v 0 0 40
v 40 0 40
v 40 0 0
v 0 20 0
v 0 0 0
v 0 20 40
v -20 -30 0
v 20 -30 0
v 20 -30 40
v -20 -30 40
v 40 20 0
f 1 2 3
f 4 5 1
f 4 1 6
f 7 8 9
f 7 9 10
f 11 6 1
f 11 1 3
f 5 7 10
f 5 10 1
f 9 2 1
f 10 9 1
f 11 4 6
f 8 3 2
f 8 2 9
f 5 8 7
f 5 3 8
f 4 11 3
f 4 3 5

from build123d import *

# Parameters (mm, degrees)
SKETCH1_W           = 40
SKETCH1_H           = 20
BOSS_EXTRUDE1_DEPTH = 40
CUT_EXTRUDE1_DEPTH  = 20


with BuildPart() as part:
    # Sketch1 → Boss-Extrude1 (new body)
    with BuildSketch(Plane.XY):
        Polygon((20, -30), (-20, -30), (0, 0), (40, 0), align=None)
        with Locations((20, 10)):
            Rectangle(SKETCH1_W, SKETCH1_H)
    extrude(amount=BOSS_EXTRUDE1_DEPTH)

    # Sketch2 → Cut-Extrude1 (cut)
    with BuildSketch(Plane(origin=(0, 20, 0), x_dir=(1, 0, 0), z_dir=(0, 1, 0))):
        Polygon((0, -40), (40, 0), (40, -40), align=None)
    extrude(amount=-CUT_EXTRUDE1_DEPTH, mode=Mode.SUBTRACT)


solid = part.part
